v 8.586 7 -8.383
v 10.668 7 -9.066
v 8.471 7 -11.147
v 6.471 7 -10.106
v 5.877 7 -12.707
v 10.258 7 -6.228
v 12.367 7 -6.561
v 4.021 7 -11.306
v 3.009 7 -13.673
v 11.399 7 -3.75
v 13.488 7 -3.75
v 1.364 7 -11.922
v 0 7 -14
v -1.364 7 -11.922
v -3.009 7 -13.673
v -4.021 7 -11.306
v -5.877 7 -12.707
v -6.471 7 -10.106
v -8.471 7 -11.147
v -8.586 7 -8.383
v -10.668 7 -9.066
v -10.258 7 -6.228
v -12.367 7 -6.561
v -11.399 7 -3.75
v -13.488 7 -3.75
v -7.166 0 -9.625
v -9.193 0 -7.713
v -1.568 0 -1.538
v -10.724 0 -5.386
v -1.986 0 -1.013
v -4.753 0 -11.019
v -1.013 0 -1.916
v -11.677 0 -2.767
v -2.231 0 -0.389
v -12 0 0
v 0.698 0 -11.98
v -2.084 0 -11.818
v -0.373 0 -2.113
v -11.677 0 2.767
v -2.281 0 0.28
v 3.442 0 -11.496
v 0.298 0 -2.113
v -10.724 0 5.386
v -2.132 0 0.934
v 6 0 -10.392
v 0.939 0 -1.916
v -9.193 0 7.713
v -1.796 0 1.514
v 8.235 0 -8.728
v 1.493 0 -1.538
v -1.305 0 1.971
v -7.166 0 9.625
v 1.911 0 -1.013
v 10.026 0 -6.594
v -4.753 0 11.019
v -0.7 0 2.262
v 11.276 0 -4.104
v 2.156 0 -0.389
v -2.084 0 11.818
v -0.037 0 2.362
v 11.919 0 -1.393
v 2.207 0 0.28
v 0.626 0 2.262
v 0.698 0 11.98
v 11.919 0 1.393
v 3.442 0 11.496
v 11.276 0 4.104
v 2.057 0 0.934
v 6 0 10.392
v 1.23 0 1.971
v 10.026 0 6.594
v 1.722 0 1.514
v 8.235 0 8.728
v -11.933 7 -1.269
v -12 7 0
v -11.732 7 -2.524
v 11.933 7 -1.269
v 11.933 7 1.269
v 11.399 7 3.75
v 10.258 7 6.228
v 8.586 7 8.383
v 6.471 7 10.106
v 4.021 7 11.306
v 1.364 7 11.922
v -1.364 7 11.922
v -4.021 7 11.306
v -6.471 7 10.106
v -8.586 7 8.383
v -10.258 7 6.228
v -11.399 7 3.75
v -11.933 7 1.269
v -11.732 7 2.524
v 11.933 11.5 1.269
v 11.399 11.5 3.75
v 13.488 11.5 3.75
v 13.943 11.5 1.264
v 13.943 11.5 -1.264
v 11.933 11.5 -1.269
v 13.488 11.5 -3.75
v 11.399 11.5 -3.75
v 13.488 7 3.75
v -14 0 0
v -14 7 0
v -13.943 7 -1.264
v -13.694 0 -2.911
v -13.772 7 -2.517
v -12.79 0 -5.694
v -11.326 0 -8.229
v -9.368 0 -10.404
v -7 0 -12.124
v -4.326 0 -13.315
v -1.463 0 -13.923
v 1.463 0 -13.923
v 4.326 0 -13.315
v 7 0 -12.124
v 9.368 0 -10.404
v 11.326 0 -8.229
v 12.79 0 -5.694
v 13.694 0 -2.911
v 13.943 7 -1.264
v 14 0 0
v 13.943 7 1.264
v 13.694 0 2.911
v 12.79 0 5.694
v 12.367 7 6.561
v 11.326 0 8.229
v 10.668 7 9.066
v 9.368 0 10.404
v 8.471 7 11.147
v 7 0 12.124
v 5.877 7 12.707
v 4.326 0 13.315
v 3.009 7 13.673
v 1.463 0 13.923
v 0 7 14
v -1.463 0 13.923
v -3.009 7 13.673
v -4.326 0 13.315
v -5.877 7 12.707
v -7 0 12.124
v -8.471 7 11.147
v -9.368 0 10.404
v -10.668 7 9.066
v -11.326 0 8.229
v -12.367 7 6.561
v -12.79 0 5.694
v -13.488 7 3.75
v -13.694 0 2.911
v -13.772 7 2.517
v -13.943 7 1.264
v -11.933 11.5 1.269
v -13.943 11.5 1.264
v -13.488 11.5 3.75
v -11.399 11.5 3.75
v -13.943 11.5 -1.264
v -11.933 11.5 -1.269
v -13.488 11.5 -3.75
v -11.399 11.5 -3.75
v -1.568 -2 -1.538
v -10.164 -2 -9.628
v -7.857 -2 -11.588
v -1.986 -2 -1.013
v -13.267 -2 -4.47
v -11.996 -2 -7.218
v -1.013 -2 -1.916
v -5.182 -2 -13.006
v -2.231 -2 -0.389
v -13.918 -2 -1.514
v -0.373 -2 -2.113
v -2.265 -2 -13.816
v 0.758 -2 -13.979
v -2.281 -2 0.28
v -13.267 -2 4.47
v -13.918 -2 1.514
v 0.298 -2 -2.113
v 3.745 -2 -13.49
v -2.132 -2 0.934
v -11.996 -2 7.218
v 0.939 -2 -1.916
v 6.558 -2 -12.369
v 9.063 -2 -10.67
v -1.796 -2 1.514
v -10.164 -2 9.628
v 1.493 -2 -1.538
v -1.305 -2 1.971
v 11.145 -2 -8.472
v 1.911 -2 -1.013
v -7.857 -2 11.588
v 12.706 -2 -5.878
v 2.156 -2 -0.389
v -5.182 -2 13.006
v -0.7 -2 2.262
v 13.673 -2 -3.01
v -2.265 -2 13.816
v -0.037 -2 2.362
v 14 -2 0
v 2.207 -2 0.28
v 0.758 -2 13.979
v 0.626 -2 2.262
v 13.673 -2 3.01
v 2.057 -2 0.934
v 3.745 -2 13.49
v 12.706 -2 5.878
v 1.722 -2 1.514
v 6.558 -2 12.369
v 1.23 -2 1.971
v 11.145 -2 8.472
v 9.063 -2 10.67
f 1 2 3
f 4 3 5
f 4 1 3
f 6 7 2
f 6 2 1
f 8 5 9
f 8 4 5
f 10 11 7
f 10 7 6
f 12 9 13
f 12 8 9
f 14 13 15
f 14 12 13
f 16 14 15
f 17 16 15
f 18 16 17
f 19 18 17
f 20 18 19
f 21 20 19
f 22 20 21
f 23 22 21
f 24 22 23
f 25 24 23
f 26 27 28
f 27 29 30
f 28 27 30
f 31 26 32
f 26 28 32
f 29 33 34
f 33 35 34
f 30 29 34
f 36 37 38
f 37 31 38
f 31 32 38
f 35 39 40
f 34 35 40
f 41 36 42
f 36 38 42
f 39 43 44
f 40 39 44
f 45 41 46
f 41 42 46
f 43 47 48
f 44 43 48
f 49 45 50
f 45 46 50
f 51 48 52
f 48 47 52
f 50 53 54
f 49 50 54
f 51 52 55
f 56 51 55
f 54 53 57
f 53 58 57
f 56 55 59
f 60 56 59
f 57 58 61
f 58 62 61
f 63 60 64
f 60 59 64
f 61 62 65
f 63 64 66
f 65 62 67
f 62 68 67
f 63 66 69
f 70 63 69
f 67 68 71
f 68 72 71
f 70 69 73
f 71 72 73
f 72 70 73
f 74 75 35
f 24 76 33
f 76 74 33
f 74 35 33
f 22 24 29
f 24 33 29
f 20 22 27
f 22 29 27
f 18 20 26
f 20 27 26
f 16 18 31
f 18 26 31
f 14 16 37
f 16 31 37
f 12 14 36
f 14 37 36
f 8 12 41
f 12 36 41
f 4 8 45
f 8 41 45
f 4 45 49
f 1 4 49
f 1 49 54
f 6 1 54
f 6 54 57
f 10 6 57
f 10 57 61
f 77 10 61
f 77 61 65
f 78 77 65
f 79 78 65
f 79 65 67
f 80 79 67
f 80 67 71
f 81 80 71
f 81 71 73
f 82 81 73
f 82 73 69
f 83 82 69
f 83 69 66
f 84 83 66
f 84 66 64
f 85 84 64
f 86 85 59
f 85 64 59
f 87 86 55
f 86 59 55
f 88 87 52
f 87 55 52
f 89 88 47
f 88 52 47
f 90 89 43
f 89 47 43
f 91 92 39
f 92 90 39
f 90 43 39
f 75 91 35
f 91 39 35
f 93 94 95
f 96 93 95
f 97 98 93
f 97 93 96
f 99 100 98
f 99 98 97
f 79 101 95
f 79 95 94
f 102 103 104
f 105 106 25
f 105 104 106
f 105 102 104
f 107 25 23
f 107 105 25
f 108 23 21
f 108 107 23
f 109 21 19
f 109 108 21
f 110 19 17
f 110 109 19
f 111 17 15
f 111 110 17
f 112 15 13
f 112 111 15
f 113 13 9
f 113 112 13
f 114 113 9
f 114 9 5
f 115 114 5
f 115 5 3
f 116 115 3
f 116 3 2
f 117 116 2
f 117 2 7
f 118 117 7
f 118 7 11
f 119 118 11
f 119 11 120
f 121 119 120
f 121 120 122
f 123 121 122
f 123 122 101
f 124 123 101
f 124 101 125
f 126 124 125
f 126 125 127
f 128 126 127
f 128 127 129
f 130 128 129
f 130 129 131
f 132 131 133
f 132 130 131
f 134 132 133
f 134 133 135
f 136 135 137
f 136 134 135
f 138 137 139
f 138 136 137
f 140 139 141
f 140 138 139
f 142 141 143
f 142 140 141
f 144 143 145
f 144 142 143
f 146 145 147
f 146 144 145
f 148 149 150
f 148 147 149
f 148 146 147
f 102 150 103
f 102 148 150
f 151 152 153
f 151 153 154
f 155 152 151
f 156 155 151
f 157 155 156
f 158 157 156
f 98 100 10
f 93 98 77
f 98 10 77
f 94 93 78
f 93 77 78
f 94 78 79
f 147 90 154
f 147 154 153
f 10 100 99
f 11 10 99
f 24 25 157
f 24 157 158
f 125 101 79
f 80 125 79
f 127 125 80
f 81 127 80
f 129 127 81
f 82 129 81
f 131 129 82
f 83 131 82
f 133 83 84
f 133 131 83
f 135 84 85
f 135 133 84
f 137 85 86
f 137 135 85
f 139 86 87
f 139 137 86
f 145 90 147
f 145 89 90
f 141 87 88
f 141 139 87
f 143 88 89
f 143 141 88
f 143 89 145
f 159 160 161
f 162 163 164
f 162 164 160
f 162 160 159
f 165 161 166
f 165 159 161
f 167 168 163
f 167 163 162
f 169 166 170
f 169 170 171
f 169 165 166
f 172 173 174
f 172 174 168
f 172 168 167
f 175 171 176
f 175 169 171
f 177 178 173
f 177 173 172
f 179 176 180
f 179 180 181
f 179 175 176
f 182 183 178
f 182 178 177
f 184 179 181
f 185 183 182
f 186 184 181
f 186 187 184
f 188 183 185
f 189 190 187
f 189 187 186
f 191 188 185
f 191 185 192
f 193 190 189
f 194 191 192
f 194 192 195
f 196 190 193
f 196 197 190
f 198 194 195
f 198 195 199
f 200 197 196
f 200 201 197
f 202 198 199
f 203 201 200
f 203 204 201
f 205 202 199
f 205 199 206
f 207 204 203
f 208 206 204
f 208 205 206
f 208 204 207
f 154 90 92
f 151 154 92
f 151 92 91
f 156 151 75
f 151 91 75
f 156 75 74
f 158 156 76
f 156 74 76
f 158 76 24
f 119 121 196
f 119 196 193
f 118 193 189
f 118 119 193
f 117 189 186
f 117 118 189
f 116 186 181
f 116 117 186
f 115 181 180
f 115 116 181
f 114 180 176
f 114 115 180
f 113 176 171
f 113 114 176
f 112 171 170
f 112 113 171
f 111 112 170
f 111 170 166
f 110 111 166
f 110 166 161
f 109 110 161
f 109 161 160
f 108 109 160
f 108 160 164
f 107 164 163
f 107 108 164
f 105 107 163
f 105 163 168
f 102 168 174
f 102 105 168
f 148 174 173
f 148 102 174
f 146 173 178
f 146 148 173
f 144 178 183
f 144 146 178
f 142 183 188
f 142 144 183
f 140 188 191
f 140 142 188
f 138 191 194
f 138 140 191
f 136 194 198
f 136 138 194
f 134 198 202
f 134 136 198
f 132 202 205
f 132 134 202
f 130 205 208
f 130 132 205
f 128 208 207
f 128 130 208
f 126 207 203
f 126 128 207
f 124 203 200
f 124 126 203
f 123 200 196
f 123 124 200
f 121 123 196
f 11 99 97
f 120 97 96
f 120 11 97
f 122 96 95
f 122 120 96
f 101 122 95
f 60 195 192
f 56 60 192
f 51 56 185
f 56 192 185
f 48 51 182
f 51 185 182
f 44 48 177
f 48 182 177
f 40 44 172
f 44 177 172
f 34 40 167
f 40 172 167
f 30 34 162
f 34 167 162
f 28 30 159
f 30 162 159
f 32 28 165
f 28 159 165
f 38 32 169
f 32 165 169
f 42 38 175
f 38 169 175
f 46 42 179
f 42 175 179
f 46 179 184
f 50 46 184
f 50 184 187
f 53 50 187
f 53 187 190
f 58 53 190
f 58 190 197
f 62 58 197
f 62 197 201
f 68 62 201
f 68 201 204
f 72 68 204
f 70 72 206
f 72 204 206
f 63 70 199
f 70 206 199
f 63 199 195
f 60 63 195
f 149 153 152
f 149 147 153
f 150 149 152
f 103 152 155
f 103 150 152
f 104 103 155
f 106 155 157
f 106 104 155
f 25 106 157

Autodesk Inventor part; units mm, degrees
ref_plane "YZ Plane" through (0, 0, 0) normal (1, 0, 0) x (0, 1, 0)
ref_plane "XZ Plane" through (0, 0, 0) normal (0, 1, 0) x (-1, 0, 0)
ref_plane "XY Plane" through (0, 0, 0) normal (0, 0, 1) x (1, 0, 0)
sketch "Sketch1" plane through (0, 0, 0) normal (0, 1, 0) x (-1, 0, 0)
  circle A0 centre (0, 0) radius 14
  circle A1 centre (0, 0) radius 12
  dimension "d0" = 28
  dimension "d1" = 24
extrude "Extrusion1" add sketch "Sketch1" along normal blind 7
sketch "Sketch2" plane through (0, 7, 0) normal (0, 1, 0) x (1, 0, 0)
  line L0 (14, -3.75) -> (-14, -3.75)
  line L1 (-14, -3.75) -> (-14, 3.75)
  line L2 (-14, 3.75) -> (14, 3.75)
  line L3 (14, 3.75) -> (14, -3.75)
  line L4 (14, -3.75) -> (-14, 3.75) construction
  line L5 (-14, -3.75) -> (14, 3.75) construction
  line L6 (-0.5, 5) -> (0.5, 5)
  line L7 (0.5, 5) -> (0.5, -5)
  line L8 (0.5, -5) -> (-0.5, -5)
  line L9 (-0.5, -5) -> (-0.5, 5)
  line L10 (-0.5, 5) -> (0.5, -5) construction
  line L11 (0.5, 5) -> (-0.5, -5) construction
  circle A0 centre (0, 0) radius 12
  circle A1 centre (0, 0) radius 14
  point P0 (0, 0)
  point P1 (-13.4884, 3.75)
  point P2 (-13.4884, -3.75)
  point P3 (-11.399, -3.75)
  point P4 (-11.399, 3.75)
  point P5 (13.4884, 3.75)
  point P6 (11.399, 3.75)
  point P7 (11.399, -3.75)
  point P8 (13.4884, -3.75)
  dimension "d4" = 28
  dimension "d5" = 7.5
  dimension "d27" = 24
  dimension "d28" = 28
sketch "Sketch3" plane through (0, 0, 0) normal (0, -1, 0) x (1, 0, 0)
  circle A0 centre (0, 0) radius 14
  dimension "d17" = 28
extrude "Extrusion3" add sketch "Sketch3" along normal blind 2
sketch "Sketch5" plane through (0, 0, 0) normal (0, 1, 0) x (1, 0, 0)
  point P0 (0, 0)
  point P1 (-0.0372, -0.1116)
hole "Hole2" at (-0.0372, 0, 0.1116) direction (0, -1, 0) diameter 4.5 end through all clearance for "Hex Head Machine Screw" size "M4" standard "Ansi Metric M Profile"
extrude "Extrusion4" add sketch "Sketch2" along normal blind 4.5 contours L0 A0 L2 A1 | A1 L2 A0 L0
properties part number "magneticslotV1"
